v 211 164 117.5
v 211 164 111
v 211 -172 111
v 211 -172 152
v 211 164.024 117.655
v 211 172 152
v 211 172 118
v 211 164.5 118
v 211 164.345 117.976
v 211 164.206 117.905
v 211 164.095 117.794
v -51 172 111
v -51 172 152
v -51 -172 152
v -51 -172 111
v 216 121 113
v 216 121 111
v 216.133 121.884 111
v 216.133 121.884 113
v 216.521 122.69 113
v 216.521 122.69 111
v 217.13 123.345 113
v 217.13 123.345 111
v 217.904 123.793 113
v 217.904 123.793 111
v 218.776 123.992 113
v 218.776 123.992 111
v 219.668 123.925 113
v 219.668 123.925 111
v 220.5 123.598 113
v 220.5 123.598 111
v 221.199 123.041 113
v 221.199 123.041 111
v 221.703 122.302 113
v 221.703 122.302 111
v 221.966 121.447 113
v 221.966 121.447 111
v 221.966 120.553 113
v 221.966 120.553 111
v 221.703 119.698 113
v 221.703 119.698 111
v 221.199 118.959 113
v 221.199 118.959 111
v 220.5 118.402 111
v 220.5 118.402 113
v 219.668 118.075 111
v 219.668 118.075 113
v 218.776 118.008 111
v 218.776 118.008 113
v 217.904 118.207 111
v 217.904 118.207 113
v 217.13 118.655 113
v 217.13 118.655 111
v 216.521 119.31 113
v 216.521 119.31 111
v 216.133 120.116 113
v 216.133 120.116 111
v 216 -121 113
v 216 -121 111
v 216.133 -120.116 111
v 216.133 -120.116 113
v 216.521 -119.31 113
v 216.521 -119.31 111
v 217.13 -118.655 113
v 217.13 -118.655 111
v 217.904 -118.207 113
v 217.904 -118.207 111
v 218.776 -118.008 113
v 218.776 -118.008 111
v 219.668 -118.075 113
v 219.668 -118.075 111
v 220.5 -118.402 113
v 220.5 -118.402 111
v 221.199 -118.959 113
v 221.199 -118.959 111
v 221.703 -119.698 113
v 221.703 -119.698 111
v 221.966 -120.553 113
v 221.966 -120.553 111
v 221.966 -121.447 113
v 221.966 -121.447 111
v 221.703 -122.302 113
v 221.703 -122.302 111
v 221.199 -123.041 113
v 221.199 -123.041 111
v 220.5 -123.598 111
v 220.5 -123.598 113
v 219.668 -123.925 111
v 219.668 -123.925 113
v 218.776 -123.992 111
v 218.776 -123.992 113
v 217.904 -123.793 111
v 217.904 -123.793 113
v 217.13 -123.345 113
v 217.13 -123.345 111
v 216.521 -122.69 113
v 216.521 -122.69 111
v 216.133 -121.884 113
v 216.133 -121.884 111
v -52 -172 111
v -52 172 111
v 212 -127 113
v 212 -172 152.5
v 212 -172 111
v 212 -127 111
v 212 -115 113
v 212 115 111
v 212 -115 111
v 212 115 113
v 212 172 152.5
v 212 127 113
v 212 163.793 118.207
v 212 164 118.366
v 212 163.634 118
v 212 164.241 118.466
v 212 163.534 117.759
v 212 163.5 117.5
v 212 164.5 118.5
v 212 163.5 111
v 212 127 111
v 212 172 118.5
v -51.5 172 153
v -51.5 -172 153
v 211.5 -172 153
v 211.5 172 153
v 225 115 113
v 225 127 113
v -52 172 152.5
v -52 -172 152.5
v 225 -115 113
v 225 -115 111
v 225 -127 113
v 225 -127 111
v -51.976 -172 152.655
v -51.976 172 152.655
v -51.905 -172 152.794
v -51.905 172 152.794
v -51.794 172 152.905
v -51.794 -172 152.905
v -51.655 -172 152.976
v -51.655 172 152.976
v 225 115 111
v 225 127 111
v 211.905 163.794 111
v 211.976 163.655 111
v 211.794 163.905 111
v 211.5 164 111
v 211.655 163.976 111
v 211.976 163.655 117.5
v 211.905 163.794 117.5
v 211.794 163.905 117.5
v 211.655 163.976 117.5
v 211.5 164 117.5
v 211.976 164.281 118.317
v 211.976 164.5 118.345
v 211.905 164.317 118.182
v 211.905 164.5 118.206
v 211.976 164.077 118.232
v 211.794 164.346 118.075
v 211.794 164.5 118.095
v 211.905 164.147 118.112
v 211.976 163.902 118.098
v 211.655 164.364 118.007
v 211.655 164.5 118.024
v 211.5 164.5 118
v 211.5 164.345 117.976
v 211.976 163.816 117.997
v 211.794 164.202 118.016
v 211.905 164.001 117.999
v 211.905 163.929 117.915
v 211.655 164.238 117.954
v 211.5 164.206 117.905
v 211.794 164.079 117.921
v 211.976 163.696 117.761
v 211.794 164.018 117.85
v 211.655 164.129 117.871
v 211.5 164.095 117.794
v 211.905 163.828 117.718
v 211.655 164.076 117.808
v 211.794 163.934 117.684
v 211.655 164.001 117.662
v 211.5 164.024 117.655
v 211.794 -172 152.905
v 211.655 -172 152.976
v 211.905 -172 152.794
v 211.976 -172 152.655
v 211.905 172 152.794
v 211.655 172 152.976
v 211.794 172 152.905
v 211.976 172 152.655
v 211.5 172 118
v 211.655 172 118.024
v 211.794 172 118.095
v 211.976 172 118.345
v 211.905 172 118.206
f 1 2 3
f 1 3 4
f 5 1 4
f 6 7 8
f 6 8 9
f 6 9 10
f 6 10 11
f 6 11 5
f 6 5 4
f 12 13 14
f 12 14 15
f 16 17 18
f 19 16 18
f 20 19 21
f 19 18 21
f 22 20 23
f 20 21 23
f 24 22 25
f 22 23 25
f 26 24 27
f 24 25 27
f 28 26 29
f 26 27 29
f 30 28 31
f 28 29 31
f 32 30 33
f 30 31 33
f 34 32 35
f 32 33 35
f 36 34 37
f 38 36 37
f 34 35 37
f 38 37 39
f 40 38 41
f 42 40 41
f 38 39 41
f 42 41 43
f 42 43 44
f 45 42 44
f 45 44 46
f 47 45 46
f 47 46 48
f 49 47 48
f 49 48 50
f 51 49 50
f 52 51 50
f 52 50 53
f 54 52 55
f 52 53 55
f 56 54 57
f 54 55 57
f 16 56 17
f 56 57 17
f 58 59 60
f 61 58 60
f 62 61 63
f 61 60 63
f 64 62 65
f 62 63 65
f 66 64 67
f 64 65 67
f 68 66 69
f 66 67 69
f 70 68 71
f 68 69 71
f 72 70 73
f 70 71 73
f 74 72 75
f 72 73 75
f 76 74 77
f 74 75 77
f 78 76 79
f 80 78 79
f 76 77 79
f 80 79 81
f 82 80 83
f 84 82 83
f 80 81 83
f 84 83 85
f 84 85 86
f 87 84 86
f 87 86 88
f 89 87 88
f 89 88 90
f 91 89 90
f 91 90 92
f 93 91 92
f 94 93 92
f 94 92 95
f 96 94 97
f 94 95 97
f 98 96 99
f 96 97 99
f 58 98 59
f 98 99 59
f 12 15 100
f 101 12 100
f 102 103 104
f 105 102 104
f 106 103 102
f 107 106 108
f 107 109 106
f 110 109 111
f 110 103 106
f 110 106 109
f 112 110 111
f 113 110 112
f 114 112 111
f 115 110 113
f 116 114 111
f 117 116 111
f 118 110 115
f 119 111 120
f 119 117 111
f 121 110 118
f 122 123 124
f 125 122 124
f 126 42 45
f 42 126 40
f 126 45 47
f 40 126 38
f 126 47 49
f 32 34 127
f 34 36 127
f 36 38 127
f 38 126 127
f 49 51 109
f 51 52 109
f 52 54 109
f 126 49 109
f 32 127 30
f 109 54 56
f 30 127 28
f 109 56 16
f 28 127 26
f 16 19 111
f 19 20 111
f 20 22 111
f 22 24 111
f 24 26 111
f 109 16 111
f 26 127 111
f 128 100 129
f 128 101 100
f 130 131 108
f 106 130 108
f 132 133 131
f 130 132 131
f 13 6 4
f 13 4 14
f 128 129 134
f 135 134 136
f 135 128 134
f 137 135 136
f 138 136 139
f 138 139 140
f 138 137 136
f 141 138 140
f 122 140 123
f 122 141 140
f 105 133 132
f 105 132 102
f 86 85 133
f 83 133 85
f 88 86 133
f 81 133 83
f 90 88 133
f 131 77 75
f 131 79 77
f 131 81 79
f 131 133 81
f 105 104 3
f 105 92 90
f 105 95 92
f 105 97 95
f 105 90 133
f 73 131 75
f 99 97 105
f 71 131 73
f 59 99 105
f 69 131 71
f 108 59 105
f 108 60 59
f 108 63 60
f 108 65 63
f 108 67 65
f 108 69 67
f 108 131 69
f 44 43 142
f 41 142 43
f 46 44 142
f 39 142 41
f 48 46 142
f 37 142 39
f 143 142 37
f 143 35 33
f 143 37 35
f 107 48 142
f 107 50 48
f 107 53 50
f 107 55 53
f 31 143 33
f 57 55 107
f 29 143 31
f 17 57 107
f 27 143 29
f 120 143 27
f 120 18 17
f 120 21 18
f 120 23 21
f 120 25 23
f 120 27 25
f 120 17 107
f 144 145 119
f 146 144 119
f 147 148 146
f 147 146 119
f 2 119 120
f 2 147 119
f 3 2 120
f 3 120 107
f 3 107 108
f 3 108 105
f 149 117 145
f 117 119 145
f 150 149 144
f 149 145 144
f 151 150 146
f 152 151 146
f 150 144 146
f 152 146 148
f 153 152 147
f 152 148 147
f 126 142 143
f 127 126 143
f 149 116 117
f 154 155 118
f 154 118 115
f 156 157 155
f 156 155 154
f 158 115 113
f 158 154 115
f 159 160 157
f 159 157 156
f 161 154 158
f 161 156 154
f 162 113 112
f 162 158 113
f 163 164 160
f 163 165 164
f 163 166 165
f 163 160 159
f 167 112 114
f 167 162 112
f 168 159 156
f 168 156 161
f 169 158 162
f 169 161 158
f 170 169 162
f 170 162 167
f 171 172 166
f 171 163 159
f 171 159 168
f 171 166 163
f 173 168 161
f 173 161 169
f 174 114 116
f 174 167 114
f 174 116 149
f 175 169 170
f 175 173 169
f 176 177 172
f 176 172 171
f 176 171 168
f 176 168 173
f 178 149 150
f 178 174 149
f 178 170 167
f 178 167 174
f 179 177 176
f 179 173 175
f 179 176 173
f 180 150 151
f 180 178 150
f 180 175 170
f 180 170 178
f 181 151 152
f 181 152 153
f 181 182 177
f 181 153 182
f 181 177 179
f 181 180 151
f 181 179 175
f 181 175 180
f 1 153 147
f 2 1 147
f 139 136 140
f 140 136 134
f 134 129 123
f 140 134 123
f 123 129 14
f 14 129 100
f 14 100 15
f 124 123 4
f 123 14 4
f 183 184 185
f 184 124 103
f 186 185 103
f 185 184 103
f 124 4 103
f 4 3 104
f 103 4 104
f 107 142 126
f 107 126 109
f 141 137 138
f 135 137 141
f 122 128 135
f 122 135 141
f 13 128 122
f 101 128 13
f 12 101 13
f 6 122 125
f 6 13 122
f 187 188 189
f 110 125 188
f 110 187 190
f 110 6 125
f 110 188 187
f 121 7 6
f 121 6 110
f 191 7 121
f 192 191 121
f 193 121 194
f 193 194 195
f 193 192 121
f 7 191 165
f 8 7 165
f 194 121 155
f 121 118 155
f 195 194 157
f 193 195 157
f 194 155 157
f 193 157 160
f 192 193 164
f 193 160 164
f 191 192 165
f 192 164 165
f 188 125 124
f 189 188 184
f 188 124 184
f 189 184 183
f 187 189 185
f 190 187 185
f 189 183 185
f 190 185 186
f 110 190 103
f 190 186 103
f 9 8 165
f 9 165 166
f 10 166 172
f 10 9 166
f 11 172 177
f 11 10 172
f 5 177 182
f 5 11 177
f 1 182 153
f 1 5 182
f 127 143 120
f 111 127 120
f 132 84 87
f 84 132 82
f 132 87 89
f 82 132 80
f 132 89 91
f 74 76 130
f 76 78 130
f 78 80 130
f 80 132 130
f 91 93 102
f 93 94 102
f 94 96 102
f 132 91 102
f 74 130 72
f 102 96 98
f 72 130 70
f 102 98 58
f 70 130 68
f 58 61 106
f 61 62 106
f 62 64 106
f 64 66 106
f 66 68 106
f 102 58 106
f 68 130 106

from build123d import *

# Parameters (mm, degrees)
WYCI_GNI_CIE_CIENKA_CIANKA1_DEPTH      = 172
WYCI_GNI_CIE_CIENKA_CIANKA1_DEPTH_BACK = 172
SZKIC2_W                               = 13
SZKIC2_H                               = 12
SZKIC2_R                               = 3
DODANIE_WYCI_GNI_CIE1_DEPTH            = 2
ZAOKR_GLENIE1_R                        = 0.5
WYTNIJ_WYCI_GNI_CIE2_DEPTH             = 14
WYTNIJ_WYCI_GNI_CIE2_DEPTH_BACK        = 2
ZAOKR_GLENIE4_R                        = 0.5
ZAOKR_GLENIE5_R                        = 0.5


with BuildPart() as part:
    # Szkic1 → Wyciągnięcie-cienka ścianka1 (new body, two sides)
    with BuildSketch(Plane(origin=(0, 0, 0), x_dir=(1, 0, 0), z_dir=(0, 1, 0))) as wyci_gni_cie_cienka_cianka1_sk:
        Polygon((211, -111), (211, -152), (-51, -152), (-51, -111), (-52, -111), (-52, -153), (212, -153), (212, -111), align=None)
    extrude(amount=WYCI_GNI_CIE_CIENKA_CIANKA1_DEPTH)
    extrude(wyci_gni_cie_cienka_cianka1_sk.sketch, amount=-WYCI_GNI_CIE_CIENKA_CIANKA1_DEPTH_BACK)

    # Szkic2 → Dodanie-wyciągnięcie1 (add)
    with BuildSketch(Plane(origin=(0, 0, 111), x_dir=(-1, 0, 0), z_dir=(0, 0, -1))):
        with Locations((-218.5, -121)):
            Rectangle(SZKIC2_W, SZKIC2_H)
        with Locations((-219, -121)):
            Circle(SZKIC2_R, mode=Mode.SUBTRACT)
        with Locations((-218.5, 121)):
            Rectangle(SZKIC2_W, SZKIC2_H)
        with Locations((-219, 121)):
            Circle(SZKIC2_R, mode=Mode.SUBTRACT)
    extrude(amount=-DODANIE_WYCI_GNI_CIE1_DEPTH)

    # Zaokrąglenie1
    zaokr_glenie1_edges = [part.edges().sort_by_distance(p)[0] for p in [
        (212, 0, 153),
        (-52, 0, 153),
    ]]
    fillet(zaokr_glenie1_edges, radius=ZAOKR_GLENIE1_R)

    # Szkic5 → Wytnij-wyciągnięcie2 (cut, two sides)
    with BuildSketch(Plane(origin=(212, 0, 0), x_dir=(0, 0, -1), z_dir=(1, 0, 0))) as wytnij_wyci_gni_cie2_sk:
        Polygon((-118, 873.551878025), (-118, 172), (-118, 164), (-111, 164), (590.551878025, 164), (1583.395439141, 1155.444306753), (874.843561116, 1864.996184778), align=None)
    extrude(amount=WYTNIJ_WYCI_GNI_CIE2_DEPTH, mode=Mode.SUBTRACT)
    extrude(wytnij_wyci_gni_cie2_sk.sketch, amount=-WYTNIJ_WYCI_GNI_CIE2_DEPTH_BACK, mode=Mode.SUBTRACT)

    # Zaokrąglenie4
    zaokr_glenie4_edges = [part.edges().sort_by_distance(p)[0] for p in [
        (211.5, 164, 118),
    ]]
    fillet(zaokr_glenie4_edges, radius=ZAOKR_GLENIE4_R)

    # Zaokrąglenie5
    zaokr_glenie5_edges = [part.edges().sort_by_distance(p)[0] for p in [
        (212, 164, 114.25),
        (212, 168.25, 118),
        (212, 164.146446609, 117.853553391),
    ]]
    fillet(zaokr_glenie5_edges, radius=ZAOKR_GLENIE5_R)


solid = part.part
